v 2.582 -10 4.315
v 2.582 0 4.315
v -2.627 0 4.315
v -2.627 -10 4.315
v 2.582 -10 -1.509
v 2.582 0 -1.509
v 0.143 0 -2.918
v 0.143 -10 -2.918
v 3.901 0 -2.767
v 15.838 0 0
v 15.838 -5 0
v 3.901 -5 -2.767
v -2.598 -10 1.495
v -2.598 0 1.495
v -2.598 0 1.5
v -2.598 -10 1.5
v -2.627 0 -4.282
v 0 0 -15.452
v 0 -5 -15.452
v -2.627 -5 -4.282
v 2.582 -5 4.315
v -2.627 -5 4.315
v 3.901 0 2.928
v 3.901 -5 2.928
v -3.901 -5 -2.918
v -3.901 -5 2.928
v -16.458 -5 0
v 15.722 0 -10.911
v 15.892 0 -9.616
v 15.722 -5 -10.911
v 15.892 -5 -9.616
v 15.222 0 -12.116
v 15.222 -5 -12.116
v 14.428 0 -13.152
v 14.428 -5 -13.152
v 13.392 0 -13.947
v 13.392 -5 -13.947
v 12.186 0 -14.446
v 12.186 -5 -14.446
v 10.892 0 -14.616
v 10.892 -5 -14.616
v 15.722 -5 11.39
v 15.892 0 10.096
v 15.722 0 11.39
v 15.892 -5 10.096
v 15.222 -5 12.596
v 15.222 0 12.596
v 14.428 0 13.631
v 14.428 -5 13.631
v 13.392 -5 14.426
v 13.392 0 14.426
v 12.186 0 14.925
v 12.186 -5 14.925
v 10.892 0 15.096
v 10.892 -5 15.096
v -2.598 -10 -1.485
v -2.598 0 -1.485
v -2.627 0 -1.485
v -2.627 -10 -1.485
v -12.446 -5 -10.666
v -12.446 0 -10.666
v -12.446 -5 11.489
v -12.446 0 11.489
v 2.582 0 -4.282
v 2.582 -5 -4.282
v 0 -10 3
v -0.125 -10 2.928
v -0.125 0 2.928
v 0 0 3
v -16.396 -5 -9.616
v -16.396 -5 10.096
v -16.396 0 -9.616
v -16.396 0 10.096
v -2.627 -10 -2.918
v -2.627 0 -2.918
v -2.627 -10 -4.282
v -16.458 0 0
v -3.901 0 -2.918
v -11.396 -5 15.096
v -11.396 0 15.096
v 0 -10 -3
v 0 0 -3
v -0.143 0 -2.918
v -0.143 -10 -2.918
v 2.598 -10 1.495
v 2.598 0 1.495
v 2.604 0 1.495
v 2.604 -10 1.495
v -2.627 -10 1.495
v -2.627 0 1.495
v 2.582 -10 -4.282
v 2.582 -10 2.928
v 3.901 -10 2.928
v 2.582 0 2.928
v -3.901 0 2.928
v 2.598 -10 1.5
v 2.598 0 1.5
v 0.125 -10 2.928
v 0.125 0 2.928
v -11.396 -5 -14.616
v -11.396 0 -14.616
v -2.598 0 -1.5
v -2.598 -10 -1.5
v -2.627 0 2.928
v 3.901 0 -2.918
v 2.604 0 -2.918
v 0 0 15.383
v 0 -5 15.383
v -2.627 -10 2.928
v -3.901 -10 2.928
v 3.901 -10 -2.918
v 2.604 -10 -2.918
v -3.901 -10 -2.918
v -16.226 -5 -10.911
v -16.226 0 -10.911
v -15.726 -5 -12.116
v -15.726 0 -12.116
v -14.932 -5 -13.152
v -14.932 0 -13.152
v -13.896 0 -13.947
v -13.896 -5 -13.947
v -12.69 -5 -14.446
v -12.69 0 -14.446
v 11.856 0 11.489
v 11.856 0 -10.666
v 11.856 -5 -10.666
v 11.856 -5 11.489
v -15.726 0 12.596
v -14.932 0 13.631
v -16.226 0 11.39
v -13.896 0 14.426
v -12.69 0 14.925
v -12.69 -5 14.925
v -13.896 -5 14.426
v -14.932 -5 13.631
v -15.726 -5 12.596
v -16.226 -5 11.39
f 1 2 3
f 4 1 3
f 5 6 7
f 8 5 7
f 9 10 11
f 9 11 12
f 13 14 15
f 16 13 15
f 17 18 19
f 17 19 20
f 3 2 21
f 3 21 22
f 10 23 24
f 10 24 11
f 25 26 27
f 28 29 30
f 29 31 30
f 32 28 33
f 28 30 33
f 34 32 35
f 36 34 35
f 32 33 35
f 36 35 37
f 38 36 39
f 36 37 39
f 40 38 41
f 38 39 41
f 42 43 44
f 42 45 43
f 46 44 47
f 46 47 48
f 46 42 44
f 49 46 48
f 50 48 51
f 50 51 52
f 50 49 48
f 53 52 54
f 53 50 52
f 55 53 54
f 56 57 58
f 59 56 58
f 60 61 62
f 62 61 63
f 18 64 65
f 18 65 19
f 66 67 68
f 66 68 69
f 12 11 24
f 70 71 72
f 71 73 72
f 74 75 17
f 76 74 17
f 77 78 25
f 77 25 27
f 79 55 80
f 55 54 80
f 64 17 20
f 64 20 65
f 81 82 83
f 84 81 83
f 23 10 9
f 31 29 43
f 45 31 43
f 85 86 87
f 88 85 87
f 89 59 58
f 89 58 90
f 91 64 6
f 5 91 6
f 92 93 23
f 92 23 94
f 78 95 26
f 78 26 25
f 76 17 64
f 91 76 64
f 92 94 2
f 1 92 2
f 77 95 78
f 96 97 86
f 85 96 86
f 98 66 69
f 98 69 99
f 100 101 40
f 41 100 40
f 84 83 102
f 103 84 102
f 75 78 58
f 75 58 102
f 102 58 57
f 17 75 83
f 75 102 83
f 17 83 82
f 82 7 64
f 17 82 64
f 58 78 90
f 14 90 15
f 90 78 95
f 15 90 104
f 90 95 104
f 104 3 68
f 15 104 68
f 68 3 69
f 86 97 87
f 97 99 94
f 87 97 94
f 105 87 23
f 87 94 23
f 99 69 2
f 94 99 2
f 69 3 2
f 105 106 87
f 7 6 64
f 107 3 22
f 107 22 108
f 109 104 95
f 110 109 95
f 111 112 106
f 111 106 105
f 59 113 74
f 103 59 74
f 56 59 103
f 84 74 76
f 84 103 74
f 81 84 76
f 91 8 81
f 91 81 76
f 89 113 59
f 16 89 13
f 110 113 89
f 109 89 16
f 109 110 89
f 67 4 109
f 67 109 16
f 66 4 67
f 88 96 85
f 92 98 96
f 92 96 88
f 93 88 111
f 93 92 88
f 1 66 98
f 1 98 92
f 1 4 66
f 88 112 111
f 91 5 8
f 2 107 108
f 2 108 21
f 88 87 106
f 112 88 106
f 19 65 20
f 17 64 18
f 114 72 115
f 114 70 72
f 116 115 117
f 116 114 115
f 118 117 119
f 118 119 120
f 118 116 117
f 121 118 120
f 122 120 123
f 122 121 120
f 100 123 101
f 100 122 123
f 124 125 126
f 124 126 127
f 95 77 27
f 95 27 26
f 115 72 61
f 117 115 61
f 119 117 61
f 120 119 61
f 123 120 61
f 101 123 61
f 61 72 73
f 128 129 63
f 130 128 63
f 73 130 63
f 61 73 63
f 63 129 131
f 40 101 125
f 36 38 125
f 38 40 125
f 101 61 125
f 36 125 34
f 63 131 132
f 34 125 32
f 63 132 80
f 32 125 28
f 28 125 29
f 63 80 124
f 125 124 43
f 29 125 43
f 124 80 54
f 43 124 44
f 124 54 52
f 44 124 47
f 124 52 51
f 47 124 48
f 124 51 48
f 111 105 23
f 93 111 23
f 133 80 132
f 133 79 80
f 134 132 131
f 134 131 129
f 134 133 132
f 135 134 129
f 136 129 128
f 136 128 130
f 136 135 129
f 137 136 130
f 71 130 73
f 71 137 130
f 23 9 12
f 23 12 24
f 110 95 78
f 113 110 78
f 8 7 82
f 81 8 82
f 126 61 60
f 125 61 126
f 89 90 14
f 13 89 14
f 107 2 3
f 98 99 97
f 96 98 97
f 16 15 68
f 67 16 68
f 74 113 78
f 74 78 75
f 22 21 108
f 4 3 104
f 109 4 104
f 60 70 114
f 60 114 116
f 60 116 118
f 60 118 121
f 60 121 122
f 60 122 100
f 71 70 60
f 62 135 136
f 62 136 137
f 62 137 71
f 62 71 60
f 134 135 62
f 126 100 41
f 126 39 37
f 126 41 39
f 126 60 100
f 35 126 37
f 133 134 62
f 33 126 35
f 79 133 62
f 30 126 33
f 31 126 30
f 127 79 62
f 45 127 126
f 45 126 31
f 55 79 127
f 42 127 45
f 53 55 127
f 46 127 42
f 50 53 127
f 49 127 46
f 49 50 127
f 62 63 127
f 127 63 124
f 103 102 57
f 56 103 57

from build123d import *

# Parameters (mm, degrees)
F2_DEPTH = 10
F4_DEPTH = 5
F5_W     = 4.0360325947
F5_H     = 22.1552448347
F5_W_2   = 24.3020709604
F5_H_2   = 3.6066677421
F5_W_3   = 3.9501627907
F5_H_3   = 3.9501599967
F6_DEPTH = 5
F7_R     = 5


with BuildPart() as f2:
    # F1 (on face) → F2 (new body)
    with BuildSketch(Plane.XZ):
        Polygon((-2.6268342044, 2.9277561698), (-2.6268342044, 1.4948317548), (-2.5980762114, 1.4948317548), (-2.5980762114, 1.5), (-0.1251299844, 2.9277561698), align=None)
        Polygon((-2.6268342044, -1.4847409911), (-2.6268342044, 1.4948317548), (-2.6268342044, 2.9277561698), (-3.9005447179, 2.9277561698), (-3.9005447179, -2.9176650569), (-2.6268342044, -2.9176650569), align=None)
        Polygon((-2.6268342044, 4.3151909485), (-2.6268342044, 2.9277561698), (-0.1251299844, 2.9277561698), (0, 3), (0.1251299844, 2.9277561698), (2.5817316491, 2.9277561698), (2.5817316491, 4.3151909485), align=None)
        Polygon((-2.5980762114, -1.4847409911), (-2.6268342044, -1.4847409911), (-2.6268342044, -2.9176650569), (-0.1426083047, -2.9176650569), (-2.5980762114, -1.5), align=None)
        Polygon((2.5980762114, 1.5), (2.5980762114, 1.4948317548), (2.6044766419, 1.4948317548), (2.6044766419, 2.9277561698), (2.5817316491, 2.9277561698), (0.1251299844, 2.9277561698), align=None)
        Polygon((-0.1426083047, -2.9176650569), (-2.6268342044, -2.9176650569), (-2.6268342044, -4.2823553085), (2.5817316491, -4.2823553085), (2.5817316491, -2.9176650569), (0.1426083047, -2.9176650569), (0, -3), align=None)
        Polygon((2.6044766419, 2.9277561698), (2.6044766419, 1.4948317548), (2.6044766419, -2.9176650569), (3.9009321481, -2.9176650569), (3.9009321481, 2.9277561698), align=None)
        Polygon((2.5817316491, -2.9176650569), (2.5817316491, -1.5094365374), (0.1426083047, -2.9176650569), align=None)
    extrude(amount=F2_DEPTH)


with BuildPart() as f4:
    # F3 (on face) → F4 (new body)
    with BuildSketch(Plane(origin=(0, 0, 0), x_dir=(-1, 0, 0), z_dir=(0, 1, 0))):
        Polygon((-3.9009321481, -2.7673800444), (-3.9009321481, 2.9277561698), (-15.8375352621, 0), align=None)
    extrude(amount=-F4_DEPTH)


with BuildPart() as f4b:
    # F3 (on face) → F4, piece 2 (new body)
    with BuildSketch(Plane(origin=(0, 0, 0), x_dir=(-1, 0, 0), z_dir=(0, 1, 0))):
        Polygon((-2.5817316491, 4.3151909485), (0, 4.3151909485), (0, 15.3830023482), align=None)
        Polygon((0, 15.3830023482), (0, 4.3151909485), (2.6268342044, 4.3151909485), align=None)
    extrude(amount=-F4_DEPTH)


with BuildPart() as f4c:
    # F3 (on face) → F4, piece 3 (new body)
    with BuildSketch(Plane(origin=(0, 0, 0), x_dir=(-1, 0, 0), z_dir=(0, 1, 0))):
        Polygon((16.458151862, 0), (3.9005447179, 2.9277561698), (3.9005447179, -2.9176650569), align=None)
    extrude(amount=-F4_DEPTH)


with BuildPart() as f4d:
    # F3 (on face) → F4, piece 4 (new body)
    with BuildSketch(Plane(origin=(0, 0, 0), x_dir=(-1, 0, 0), z_dir=(0, 1, 0))):
        Polygon((0, -15.4520757496), (2.6268342044, -4.2823553085), (-2.5817316491, -4.2823553085), align=None)
    extrude(amount=-F4_DEPTH)


with BuildPart() as f6:
    # F5 (on Front) → F6 (new body)
    with BuildSketch(Plane.XZ):
        with Locations((13.8741279952, 0.4113134928)):
            Rectangle(F5_W, F5_H)
        with Locations((-0.2949237823, 13.2922697812)):
            Rectangle(F5_W_2, F5_H_2)
        Polygon((-16.3961220533, -10.6663089246), (-12.4459592625, -10.6663089246), (-12.4459592625, 11.4889359102), (-12.4459592625, 15.0956036523), (-16.3961220533, 15.0956036523), align=None)
        with Locations((-14.4210406579, -12.6413889229)):
            Rectangle(F5_W_3, F5_H_3)
        with Locations((-0.2949237823, -12.6413889229)):
            Rectangle(F5_W_2, F5_H_3)
        with Locations((13.8741279952, -12.6413889229)):
            Rectangle(F5_W, F5_H_3)
        with Locations((13.8741279952, 13.2922697812)):
            Rectangle(F5_W, F5_H_2)
    extrude(amount=F6_DEPTH)

    # F7
    f7_edges = [f6.edges().sort_by_distance(p)[0] for p in [
        (15.892144, -2.5, -14.616469),
        (-16.396122, -2.5, -14.616469),
        (15.892144, -2.5, 15.095604),
        (-16.396122, -2.5, 15.095604),
    ]]
    fillet(f7_edges, radius=F7_R)


solid = Compound([f2.part, f4.part, f4b.part, f4c.part, f4d.part, f6.part])
